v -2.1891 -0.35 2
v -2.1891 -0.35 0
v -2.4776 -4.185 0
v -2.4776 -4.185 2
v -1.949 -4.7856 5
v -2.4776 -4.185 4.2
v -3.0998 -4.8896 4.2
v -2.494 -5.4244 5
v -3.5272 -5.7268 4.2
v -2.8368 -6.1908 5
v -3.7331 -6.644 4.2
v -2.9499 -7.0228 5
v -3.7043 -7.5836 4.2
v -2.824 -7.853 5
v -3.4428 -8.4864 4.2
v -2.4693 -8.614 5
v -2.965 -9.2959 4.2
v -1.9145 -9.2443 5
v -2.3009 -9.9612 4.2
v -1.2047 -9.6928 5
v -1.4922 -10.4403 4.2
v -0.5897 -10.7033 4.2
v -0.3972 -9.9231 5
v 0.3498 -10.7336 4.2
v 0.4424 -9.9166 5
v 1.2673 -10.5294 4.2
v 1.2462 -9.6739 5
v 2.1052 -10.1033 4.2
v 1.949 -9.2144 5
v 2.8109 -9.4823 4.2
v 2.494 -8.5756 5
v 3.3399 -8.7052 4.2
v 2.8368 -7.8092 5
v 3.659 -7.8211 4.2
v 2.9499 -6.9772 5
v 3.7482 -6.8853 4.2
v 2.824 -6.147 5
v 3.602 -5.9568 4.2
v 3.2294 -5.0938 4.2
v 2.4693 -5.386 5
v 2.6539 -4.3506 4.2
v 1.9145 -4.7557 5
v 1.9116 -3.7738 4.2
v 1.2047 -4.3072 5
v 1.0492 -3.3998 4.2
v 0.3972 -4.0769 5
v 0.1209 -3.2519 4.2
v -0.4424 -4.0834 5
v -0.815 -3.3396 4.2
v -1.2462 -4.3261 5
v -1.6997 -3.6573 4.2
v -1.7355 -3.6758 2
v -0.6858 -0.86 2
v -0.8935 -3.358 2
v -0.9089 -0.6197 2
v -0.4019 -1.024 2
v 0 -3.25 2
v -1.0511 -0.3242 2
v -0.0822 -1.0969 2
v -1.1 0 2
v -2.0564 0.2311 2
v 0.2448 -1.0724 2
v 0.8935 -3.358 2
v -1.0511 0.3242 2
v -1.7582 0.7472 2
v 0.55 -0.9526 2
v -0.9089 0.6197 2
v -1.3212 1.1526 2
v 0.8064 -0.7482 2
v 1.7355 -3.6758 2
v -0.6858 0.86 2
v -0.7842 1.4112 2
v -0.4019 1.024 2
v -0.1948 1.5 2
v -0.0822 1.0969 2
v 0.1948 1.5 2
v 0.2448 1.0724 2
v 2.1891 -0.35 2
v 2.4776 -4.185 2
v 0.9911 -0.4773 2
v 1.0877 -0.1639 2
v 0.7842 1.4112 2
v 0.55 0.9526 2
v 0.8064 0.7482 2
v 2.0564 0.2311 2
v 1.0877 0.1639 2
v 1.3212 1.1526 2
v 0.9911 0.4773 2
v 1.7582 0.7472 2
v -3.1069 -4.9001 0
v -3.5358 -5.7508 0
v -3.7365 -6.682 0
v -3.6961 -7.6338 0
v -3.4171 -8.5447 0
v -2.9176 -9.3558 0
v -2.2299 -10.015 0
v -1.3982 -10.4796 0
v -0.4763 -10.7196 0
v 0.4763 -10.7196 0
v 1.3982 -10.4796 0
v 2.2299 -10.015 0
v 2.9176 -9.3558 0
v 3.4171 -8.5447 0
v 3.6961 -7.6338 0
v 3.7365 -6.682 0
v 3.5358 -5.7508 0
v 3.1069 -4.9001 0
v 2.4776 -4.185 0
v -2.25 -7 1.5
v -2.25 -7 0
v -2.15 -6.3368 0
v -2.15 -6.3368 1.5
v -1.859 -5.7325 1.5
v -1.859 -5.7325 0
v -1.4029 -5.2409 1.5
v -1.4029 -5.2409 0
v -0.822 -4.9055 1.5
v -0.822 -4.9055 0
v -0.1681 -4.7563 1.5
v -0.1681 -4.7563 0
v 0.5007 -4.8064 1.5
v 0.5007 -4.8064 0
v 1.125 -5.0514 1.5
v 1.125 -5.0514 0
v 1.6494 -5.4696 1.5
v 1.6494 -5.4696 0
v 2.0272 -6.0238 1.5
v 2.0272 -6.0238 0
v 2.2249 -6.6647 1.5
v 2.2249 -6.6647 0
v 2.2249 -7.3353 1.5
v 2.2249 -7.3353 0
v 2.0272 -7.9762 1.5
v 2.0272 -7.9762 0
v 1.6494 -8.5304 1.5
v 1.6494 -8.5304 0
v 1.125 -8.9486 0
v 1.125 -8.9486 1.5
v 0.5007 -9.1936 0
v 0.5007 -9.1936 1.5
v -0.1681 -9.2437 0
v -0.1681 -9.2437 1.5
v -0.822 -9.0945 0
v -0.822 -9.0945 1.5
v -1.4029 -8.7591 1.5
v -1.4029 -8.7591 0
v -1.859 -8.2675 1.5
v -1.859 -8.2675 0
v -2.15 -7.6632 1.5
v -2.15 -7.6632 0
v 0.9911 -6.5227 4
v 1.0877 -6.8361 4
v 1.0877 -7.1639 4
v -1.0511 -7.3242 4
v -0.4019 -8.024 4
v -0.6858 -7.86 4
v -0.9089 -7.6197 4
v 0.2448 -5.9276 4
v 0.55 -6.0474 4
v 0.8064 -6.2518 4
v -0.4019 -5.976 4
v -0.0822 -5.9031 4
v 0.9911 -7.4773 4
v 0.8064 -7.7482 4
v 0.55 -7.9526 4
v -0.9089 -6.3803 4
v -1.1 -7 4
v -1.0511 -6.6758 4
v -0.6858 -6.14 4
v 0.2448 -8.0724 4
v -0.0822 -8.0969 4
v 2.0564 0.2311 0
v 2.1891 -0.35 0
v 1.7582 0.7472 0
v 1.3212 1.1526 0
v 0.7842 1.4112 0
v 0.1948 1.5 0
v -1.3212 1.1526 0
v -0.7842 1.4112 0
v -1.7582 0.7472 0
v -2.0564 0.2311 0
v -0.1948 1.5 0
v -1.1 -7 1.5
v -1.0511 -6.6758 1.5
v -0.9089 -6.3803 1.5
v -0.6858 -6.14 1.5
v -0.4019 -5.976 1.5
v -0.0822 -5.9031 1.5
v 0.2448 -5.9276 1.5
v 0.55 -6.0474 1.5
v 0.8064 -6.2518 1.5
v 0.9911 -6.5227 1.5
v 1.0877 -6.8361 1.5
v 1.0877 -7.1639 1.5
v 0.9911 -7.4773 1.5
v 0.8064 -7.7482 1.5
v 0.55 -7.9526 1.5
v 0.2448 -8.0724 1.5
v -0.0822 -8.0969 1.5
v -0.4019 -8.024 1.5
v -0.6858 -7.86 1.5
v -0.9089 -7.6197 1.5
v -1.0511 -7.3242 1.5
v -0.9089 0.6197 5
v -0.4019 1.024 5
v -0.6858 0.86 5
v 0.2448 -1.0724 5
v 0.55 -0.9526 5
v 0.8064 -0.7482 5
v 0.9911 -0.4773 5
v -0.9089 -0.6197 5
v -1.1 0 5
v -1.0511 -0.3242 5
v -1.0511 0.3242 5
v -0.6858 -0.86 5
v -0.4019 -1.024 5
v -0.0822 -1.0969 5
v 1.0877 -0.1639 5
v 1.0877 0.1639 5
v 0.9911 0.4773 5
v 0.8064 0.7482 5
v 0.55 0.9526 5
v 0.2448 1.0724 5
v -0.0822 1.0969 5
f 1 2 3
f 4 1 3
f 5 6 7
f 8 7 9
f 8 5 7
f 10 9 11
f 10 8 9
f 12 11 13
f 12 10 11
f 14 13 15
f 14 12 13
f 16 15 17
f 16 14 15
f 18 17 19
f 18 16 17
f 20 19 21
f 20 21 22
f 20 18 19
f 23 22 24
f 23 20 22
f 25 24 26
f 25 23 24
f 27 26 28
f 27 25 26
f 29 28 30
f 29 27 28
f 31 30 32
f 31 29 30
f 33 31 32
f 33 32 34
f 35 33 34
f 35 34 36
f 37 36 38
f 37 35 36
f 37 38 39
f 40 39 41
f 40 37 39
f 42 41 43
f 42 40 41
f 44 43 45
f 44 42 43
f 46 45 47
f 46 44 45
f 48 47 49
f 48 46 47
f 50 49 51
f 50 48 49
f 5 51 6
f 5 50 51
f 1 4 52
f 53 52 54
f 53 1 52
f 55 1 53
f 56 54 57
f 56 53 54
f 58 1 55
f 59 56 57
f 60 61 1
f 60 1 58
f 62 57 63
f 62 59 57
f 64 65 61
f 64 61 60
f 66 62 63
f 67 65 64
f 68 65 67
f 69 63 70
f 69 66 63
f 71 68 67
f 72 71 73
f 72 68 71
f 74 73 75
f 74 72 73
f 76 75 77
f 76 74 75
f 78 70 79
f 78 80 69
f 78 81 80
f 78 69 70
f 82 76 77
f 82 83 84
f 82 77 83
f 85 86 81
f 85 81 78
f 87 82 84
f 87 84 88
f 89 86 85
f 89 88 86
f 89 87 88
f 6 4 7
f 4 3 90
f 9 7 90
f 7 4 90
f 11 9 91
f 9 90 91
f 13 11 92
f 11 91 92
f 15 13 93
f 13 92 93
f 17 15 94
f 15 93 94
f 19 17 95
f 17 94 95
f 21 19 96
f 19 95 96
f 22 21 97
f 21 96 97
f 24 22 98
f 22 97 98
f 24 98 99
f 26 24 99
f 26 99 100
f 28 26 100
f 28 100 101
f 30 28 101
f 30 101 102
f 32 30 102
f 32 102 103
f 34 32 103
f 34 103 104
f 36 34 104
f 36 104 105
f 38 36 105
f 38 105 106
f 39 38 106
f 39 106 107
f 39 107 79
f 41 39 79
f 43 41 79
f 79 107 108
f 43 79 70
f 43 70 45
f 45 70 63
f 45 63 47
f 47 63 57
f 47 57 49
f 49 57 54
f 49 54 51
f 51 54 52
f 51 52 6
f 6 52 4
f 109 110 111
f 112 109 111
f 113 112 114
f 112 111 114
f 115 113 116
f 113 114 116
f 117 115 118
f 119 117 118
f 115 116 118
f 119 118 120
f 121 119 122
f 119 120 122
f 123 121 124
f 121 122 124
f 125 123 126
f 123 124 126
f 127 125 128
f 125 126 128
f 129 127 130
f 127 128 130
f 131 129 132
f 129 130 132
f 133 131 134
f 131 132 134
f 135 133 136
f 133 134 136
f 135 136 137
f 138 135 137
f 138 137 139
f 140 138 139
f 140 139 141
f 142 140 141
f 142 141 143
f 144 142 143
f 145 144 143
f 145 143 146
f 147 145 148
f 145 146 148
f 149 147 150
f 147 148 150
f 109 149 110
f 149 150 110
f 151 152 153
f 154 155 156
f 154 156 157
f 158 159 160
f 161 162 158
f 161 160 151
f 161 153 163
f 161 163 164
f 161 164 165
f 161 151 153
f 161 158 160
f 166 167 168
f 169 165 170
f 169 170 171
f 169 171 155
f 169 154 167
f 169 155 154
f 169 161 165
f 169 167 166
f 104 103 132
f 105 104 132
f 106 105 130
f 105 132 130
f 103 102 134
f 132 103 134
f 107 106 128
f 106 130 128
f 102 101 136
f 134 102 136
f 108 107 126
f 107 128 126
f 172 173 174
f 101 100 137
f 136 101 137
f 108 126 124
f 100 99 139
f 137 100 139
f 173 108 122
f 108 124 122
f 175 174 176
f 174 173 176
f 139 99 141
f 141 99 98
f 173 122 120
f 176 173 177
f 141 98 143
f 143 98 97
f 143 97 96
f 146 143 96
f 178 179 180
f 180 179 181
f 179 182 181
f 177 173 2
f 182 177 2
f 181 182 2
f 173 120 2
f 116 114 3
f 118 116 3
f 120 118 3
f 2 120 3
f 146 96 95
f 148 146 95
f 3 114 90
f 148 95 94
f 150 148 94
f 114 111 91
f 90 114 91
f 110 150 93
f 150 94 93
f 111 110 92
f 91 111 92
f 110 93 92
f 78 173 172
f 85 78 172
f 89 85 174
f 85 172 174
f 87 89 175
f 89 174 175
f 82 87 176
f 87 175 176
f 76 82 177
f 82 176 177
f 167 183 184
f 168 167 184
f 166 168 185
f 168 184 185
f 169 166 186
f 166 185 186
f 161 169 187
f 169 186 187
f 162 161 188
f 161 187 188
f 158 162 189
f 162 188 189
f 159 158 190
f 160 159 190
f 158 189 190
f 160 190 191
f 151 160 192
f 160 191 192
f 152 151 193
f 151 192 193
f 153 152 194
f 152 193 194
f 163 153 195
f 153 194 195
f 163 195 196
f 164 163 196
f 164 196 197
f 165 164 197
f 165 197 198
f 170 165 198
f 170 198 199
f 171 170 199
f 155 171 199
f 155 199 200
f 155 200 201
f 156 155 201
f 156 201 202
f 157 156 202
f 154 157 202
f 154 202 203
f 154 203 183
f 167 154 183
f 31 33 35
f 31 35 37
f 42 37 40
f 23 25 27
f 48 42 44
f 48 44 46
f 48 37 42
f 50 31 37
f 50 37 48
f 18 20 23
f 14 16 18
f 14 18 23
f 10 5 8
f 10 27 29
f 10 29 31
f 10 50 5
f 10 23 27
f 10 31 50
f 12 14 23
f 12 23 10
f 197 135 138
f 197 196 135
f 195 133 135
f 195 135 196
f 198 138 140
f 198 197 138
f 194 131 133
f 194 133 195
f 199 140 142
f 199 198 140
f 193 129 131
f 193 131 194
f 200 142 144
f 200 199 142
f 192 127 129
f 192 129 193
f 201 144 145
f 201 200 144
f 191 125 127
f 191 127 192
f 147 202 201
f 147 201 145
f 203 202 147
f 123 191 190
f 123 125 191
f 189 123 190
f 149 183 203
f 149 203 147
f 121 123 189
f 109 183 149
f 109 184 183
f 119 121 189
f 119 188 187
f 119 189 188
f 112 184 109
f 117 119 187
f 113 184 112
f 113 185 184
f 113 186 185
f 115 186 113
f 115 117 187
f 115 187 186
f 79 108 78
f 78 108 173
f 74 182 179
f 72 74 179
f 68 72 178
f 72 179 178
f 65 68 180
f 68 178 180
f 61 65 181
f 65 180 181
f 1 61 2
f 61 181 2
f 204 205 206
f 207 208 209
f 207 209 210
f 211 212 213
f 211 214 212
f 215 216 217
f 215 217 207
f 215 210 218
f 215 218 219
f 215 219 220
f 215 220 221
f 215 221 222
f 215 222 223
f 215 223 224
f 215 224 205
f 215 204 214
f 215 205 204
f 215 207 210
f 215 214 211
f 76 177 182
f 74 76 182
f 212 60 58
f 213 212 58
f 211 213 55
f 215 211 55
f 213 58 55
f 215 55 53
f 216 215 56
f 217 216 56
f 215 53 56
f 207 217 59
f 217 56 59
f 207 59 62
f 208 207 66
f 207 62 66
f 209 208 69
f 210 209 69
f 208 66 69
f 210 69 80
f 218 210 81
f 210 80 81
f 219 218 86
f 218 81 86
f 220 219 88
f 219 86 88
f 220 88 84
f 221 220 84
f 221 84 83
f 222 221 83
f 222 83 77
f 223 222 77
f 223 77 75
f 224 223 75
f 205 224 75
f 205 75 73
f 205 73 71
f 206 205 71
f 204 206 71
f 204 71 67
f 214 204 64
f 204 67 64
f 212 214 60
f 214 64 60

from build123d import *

# Parameters (mm, degrees)
EXTRUDE_1_DEPTH     = 2
SKETCH_2_R          = 1.1
EXTRUDE_2_DEPTH     = 3
SKETCH_3_R          = 3.75
EXTRUDE_3_DEPTH     = 5
CHAMFER_1_SIZE      = 0.8
SKETCH_4_R          = 1.1
CUT_EXTRUDE_1_DEPTH = 4
SKETCH_5_R          = 2.25
CUT_EXTRUDE_2_DEPTH = 1.5


with BuildPart() as part:
    # 草图1 → 凸台-拉伸1 (new body)
    with BuildSketch(Plane.XY):
        with BuildLine():
            Line((-2.189141888, -0.35), (-2.65, -6.47746827))
            Line((-2.65, -6.47746827), (2.65, -6.47746827))
            Line((2.65, -6.47746827), (2.189141888, -0.35))
            ThreePointArc((2.189141888, -0.35), (1.554921872, 0.96628783), (0.194774821, 1.5))
            Line((0.194774821, 1.5), (-0.194774821, 1.5))
            ThreePointArc((-0.194774821, 1.5), (-1.554921872, 0.96628783), (-2.189141888, -0.35))
        make_face()
    extrude(amount=EXTRUDE_1_DEPTH)

    # 草图2 → 凸台-拉伸2 (add)
    with BuildSketch(Plane.XY.offset(2)):
        with Locations(Location((0, 0, 0), (0, 0, 180))):
            Circle(SKETCH_2_R)
    extrude(amount=EXTRUDE_2_DEPTH)

    # 草图3 → 凸台-拉伸3 (add)
    with BuildSketch(Plane.XY):
        with Locations(Location((0, -7, 0), (0, 0, 131.352385807))):
            Circle(SKETCH_3_R)
    extrude(amount=EXTRUDE_3_DEPTH)

    # 倒角1
    chamfer_1_edges = [part.edges().sort_by_distance(p)[0] for p in [
        (2.477581037, -9.814976413, 5),
    ]]
    chamfer(chamfer_1_edges, length=CHAMFER_1_SIZE)

    # 草图4 → 切除-拉伸1 (cut)
    with BuildSketch(Plane(origin=(0, 0, 0), x_dir=(-1, 0, 0), z_dir=(0, 0, -1))):
        with Locations((0, -7)):
            Circle(SKETCH_4_R)
    extrude(amount=-CUT_EXTRUDE_1_DEPTH, mode=Mode.SUBTRACT)

    # 草图5 → 切除-拉伸2 (cut)
    with BuildSketch(Plane(origin=(0, 0, 0), x_dir=(-1, 0, 0), z_dir=(0, 0, -1))):
        with Locations((0, -7)):
            Circle(SKETCH_5_R)
    extrude(amount=-CUT_EXTRUDE_2_DEPTH, mode=Mode.SUBTRACT)


solid = part.part
